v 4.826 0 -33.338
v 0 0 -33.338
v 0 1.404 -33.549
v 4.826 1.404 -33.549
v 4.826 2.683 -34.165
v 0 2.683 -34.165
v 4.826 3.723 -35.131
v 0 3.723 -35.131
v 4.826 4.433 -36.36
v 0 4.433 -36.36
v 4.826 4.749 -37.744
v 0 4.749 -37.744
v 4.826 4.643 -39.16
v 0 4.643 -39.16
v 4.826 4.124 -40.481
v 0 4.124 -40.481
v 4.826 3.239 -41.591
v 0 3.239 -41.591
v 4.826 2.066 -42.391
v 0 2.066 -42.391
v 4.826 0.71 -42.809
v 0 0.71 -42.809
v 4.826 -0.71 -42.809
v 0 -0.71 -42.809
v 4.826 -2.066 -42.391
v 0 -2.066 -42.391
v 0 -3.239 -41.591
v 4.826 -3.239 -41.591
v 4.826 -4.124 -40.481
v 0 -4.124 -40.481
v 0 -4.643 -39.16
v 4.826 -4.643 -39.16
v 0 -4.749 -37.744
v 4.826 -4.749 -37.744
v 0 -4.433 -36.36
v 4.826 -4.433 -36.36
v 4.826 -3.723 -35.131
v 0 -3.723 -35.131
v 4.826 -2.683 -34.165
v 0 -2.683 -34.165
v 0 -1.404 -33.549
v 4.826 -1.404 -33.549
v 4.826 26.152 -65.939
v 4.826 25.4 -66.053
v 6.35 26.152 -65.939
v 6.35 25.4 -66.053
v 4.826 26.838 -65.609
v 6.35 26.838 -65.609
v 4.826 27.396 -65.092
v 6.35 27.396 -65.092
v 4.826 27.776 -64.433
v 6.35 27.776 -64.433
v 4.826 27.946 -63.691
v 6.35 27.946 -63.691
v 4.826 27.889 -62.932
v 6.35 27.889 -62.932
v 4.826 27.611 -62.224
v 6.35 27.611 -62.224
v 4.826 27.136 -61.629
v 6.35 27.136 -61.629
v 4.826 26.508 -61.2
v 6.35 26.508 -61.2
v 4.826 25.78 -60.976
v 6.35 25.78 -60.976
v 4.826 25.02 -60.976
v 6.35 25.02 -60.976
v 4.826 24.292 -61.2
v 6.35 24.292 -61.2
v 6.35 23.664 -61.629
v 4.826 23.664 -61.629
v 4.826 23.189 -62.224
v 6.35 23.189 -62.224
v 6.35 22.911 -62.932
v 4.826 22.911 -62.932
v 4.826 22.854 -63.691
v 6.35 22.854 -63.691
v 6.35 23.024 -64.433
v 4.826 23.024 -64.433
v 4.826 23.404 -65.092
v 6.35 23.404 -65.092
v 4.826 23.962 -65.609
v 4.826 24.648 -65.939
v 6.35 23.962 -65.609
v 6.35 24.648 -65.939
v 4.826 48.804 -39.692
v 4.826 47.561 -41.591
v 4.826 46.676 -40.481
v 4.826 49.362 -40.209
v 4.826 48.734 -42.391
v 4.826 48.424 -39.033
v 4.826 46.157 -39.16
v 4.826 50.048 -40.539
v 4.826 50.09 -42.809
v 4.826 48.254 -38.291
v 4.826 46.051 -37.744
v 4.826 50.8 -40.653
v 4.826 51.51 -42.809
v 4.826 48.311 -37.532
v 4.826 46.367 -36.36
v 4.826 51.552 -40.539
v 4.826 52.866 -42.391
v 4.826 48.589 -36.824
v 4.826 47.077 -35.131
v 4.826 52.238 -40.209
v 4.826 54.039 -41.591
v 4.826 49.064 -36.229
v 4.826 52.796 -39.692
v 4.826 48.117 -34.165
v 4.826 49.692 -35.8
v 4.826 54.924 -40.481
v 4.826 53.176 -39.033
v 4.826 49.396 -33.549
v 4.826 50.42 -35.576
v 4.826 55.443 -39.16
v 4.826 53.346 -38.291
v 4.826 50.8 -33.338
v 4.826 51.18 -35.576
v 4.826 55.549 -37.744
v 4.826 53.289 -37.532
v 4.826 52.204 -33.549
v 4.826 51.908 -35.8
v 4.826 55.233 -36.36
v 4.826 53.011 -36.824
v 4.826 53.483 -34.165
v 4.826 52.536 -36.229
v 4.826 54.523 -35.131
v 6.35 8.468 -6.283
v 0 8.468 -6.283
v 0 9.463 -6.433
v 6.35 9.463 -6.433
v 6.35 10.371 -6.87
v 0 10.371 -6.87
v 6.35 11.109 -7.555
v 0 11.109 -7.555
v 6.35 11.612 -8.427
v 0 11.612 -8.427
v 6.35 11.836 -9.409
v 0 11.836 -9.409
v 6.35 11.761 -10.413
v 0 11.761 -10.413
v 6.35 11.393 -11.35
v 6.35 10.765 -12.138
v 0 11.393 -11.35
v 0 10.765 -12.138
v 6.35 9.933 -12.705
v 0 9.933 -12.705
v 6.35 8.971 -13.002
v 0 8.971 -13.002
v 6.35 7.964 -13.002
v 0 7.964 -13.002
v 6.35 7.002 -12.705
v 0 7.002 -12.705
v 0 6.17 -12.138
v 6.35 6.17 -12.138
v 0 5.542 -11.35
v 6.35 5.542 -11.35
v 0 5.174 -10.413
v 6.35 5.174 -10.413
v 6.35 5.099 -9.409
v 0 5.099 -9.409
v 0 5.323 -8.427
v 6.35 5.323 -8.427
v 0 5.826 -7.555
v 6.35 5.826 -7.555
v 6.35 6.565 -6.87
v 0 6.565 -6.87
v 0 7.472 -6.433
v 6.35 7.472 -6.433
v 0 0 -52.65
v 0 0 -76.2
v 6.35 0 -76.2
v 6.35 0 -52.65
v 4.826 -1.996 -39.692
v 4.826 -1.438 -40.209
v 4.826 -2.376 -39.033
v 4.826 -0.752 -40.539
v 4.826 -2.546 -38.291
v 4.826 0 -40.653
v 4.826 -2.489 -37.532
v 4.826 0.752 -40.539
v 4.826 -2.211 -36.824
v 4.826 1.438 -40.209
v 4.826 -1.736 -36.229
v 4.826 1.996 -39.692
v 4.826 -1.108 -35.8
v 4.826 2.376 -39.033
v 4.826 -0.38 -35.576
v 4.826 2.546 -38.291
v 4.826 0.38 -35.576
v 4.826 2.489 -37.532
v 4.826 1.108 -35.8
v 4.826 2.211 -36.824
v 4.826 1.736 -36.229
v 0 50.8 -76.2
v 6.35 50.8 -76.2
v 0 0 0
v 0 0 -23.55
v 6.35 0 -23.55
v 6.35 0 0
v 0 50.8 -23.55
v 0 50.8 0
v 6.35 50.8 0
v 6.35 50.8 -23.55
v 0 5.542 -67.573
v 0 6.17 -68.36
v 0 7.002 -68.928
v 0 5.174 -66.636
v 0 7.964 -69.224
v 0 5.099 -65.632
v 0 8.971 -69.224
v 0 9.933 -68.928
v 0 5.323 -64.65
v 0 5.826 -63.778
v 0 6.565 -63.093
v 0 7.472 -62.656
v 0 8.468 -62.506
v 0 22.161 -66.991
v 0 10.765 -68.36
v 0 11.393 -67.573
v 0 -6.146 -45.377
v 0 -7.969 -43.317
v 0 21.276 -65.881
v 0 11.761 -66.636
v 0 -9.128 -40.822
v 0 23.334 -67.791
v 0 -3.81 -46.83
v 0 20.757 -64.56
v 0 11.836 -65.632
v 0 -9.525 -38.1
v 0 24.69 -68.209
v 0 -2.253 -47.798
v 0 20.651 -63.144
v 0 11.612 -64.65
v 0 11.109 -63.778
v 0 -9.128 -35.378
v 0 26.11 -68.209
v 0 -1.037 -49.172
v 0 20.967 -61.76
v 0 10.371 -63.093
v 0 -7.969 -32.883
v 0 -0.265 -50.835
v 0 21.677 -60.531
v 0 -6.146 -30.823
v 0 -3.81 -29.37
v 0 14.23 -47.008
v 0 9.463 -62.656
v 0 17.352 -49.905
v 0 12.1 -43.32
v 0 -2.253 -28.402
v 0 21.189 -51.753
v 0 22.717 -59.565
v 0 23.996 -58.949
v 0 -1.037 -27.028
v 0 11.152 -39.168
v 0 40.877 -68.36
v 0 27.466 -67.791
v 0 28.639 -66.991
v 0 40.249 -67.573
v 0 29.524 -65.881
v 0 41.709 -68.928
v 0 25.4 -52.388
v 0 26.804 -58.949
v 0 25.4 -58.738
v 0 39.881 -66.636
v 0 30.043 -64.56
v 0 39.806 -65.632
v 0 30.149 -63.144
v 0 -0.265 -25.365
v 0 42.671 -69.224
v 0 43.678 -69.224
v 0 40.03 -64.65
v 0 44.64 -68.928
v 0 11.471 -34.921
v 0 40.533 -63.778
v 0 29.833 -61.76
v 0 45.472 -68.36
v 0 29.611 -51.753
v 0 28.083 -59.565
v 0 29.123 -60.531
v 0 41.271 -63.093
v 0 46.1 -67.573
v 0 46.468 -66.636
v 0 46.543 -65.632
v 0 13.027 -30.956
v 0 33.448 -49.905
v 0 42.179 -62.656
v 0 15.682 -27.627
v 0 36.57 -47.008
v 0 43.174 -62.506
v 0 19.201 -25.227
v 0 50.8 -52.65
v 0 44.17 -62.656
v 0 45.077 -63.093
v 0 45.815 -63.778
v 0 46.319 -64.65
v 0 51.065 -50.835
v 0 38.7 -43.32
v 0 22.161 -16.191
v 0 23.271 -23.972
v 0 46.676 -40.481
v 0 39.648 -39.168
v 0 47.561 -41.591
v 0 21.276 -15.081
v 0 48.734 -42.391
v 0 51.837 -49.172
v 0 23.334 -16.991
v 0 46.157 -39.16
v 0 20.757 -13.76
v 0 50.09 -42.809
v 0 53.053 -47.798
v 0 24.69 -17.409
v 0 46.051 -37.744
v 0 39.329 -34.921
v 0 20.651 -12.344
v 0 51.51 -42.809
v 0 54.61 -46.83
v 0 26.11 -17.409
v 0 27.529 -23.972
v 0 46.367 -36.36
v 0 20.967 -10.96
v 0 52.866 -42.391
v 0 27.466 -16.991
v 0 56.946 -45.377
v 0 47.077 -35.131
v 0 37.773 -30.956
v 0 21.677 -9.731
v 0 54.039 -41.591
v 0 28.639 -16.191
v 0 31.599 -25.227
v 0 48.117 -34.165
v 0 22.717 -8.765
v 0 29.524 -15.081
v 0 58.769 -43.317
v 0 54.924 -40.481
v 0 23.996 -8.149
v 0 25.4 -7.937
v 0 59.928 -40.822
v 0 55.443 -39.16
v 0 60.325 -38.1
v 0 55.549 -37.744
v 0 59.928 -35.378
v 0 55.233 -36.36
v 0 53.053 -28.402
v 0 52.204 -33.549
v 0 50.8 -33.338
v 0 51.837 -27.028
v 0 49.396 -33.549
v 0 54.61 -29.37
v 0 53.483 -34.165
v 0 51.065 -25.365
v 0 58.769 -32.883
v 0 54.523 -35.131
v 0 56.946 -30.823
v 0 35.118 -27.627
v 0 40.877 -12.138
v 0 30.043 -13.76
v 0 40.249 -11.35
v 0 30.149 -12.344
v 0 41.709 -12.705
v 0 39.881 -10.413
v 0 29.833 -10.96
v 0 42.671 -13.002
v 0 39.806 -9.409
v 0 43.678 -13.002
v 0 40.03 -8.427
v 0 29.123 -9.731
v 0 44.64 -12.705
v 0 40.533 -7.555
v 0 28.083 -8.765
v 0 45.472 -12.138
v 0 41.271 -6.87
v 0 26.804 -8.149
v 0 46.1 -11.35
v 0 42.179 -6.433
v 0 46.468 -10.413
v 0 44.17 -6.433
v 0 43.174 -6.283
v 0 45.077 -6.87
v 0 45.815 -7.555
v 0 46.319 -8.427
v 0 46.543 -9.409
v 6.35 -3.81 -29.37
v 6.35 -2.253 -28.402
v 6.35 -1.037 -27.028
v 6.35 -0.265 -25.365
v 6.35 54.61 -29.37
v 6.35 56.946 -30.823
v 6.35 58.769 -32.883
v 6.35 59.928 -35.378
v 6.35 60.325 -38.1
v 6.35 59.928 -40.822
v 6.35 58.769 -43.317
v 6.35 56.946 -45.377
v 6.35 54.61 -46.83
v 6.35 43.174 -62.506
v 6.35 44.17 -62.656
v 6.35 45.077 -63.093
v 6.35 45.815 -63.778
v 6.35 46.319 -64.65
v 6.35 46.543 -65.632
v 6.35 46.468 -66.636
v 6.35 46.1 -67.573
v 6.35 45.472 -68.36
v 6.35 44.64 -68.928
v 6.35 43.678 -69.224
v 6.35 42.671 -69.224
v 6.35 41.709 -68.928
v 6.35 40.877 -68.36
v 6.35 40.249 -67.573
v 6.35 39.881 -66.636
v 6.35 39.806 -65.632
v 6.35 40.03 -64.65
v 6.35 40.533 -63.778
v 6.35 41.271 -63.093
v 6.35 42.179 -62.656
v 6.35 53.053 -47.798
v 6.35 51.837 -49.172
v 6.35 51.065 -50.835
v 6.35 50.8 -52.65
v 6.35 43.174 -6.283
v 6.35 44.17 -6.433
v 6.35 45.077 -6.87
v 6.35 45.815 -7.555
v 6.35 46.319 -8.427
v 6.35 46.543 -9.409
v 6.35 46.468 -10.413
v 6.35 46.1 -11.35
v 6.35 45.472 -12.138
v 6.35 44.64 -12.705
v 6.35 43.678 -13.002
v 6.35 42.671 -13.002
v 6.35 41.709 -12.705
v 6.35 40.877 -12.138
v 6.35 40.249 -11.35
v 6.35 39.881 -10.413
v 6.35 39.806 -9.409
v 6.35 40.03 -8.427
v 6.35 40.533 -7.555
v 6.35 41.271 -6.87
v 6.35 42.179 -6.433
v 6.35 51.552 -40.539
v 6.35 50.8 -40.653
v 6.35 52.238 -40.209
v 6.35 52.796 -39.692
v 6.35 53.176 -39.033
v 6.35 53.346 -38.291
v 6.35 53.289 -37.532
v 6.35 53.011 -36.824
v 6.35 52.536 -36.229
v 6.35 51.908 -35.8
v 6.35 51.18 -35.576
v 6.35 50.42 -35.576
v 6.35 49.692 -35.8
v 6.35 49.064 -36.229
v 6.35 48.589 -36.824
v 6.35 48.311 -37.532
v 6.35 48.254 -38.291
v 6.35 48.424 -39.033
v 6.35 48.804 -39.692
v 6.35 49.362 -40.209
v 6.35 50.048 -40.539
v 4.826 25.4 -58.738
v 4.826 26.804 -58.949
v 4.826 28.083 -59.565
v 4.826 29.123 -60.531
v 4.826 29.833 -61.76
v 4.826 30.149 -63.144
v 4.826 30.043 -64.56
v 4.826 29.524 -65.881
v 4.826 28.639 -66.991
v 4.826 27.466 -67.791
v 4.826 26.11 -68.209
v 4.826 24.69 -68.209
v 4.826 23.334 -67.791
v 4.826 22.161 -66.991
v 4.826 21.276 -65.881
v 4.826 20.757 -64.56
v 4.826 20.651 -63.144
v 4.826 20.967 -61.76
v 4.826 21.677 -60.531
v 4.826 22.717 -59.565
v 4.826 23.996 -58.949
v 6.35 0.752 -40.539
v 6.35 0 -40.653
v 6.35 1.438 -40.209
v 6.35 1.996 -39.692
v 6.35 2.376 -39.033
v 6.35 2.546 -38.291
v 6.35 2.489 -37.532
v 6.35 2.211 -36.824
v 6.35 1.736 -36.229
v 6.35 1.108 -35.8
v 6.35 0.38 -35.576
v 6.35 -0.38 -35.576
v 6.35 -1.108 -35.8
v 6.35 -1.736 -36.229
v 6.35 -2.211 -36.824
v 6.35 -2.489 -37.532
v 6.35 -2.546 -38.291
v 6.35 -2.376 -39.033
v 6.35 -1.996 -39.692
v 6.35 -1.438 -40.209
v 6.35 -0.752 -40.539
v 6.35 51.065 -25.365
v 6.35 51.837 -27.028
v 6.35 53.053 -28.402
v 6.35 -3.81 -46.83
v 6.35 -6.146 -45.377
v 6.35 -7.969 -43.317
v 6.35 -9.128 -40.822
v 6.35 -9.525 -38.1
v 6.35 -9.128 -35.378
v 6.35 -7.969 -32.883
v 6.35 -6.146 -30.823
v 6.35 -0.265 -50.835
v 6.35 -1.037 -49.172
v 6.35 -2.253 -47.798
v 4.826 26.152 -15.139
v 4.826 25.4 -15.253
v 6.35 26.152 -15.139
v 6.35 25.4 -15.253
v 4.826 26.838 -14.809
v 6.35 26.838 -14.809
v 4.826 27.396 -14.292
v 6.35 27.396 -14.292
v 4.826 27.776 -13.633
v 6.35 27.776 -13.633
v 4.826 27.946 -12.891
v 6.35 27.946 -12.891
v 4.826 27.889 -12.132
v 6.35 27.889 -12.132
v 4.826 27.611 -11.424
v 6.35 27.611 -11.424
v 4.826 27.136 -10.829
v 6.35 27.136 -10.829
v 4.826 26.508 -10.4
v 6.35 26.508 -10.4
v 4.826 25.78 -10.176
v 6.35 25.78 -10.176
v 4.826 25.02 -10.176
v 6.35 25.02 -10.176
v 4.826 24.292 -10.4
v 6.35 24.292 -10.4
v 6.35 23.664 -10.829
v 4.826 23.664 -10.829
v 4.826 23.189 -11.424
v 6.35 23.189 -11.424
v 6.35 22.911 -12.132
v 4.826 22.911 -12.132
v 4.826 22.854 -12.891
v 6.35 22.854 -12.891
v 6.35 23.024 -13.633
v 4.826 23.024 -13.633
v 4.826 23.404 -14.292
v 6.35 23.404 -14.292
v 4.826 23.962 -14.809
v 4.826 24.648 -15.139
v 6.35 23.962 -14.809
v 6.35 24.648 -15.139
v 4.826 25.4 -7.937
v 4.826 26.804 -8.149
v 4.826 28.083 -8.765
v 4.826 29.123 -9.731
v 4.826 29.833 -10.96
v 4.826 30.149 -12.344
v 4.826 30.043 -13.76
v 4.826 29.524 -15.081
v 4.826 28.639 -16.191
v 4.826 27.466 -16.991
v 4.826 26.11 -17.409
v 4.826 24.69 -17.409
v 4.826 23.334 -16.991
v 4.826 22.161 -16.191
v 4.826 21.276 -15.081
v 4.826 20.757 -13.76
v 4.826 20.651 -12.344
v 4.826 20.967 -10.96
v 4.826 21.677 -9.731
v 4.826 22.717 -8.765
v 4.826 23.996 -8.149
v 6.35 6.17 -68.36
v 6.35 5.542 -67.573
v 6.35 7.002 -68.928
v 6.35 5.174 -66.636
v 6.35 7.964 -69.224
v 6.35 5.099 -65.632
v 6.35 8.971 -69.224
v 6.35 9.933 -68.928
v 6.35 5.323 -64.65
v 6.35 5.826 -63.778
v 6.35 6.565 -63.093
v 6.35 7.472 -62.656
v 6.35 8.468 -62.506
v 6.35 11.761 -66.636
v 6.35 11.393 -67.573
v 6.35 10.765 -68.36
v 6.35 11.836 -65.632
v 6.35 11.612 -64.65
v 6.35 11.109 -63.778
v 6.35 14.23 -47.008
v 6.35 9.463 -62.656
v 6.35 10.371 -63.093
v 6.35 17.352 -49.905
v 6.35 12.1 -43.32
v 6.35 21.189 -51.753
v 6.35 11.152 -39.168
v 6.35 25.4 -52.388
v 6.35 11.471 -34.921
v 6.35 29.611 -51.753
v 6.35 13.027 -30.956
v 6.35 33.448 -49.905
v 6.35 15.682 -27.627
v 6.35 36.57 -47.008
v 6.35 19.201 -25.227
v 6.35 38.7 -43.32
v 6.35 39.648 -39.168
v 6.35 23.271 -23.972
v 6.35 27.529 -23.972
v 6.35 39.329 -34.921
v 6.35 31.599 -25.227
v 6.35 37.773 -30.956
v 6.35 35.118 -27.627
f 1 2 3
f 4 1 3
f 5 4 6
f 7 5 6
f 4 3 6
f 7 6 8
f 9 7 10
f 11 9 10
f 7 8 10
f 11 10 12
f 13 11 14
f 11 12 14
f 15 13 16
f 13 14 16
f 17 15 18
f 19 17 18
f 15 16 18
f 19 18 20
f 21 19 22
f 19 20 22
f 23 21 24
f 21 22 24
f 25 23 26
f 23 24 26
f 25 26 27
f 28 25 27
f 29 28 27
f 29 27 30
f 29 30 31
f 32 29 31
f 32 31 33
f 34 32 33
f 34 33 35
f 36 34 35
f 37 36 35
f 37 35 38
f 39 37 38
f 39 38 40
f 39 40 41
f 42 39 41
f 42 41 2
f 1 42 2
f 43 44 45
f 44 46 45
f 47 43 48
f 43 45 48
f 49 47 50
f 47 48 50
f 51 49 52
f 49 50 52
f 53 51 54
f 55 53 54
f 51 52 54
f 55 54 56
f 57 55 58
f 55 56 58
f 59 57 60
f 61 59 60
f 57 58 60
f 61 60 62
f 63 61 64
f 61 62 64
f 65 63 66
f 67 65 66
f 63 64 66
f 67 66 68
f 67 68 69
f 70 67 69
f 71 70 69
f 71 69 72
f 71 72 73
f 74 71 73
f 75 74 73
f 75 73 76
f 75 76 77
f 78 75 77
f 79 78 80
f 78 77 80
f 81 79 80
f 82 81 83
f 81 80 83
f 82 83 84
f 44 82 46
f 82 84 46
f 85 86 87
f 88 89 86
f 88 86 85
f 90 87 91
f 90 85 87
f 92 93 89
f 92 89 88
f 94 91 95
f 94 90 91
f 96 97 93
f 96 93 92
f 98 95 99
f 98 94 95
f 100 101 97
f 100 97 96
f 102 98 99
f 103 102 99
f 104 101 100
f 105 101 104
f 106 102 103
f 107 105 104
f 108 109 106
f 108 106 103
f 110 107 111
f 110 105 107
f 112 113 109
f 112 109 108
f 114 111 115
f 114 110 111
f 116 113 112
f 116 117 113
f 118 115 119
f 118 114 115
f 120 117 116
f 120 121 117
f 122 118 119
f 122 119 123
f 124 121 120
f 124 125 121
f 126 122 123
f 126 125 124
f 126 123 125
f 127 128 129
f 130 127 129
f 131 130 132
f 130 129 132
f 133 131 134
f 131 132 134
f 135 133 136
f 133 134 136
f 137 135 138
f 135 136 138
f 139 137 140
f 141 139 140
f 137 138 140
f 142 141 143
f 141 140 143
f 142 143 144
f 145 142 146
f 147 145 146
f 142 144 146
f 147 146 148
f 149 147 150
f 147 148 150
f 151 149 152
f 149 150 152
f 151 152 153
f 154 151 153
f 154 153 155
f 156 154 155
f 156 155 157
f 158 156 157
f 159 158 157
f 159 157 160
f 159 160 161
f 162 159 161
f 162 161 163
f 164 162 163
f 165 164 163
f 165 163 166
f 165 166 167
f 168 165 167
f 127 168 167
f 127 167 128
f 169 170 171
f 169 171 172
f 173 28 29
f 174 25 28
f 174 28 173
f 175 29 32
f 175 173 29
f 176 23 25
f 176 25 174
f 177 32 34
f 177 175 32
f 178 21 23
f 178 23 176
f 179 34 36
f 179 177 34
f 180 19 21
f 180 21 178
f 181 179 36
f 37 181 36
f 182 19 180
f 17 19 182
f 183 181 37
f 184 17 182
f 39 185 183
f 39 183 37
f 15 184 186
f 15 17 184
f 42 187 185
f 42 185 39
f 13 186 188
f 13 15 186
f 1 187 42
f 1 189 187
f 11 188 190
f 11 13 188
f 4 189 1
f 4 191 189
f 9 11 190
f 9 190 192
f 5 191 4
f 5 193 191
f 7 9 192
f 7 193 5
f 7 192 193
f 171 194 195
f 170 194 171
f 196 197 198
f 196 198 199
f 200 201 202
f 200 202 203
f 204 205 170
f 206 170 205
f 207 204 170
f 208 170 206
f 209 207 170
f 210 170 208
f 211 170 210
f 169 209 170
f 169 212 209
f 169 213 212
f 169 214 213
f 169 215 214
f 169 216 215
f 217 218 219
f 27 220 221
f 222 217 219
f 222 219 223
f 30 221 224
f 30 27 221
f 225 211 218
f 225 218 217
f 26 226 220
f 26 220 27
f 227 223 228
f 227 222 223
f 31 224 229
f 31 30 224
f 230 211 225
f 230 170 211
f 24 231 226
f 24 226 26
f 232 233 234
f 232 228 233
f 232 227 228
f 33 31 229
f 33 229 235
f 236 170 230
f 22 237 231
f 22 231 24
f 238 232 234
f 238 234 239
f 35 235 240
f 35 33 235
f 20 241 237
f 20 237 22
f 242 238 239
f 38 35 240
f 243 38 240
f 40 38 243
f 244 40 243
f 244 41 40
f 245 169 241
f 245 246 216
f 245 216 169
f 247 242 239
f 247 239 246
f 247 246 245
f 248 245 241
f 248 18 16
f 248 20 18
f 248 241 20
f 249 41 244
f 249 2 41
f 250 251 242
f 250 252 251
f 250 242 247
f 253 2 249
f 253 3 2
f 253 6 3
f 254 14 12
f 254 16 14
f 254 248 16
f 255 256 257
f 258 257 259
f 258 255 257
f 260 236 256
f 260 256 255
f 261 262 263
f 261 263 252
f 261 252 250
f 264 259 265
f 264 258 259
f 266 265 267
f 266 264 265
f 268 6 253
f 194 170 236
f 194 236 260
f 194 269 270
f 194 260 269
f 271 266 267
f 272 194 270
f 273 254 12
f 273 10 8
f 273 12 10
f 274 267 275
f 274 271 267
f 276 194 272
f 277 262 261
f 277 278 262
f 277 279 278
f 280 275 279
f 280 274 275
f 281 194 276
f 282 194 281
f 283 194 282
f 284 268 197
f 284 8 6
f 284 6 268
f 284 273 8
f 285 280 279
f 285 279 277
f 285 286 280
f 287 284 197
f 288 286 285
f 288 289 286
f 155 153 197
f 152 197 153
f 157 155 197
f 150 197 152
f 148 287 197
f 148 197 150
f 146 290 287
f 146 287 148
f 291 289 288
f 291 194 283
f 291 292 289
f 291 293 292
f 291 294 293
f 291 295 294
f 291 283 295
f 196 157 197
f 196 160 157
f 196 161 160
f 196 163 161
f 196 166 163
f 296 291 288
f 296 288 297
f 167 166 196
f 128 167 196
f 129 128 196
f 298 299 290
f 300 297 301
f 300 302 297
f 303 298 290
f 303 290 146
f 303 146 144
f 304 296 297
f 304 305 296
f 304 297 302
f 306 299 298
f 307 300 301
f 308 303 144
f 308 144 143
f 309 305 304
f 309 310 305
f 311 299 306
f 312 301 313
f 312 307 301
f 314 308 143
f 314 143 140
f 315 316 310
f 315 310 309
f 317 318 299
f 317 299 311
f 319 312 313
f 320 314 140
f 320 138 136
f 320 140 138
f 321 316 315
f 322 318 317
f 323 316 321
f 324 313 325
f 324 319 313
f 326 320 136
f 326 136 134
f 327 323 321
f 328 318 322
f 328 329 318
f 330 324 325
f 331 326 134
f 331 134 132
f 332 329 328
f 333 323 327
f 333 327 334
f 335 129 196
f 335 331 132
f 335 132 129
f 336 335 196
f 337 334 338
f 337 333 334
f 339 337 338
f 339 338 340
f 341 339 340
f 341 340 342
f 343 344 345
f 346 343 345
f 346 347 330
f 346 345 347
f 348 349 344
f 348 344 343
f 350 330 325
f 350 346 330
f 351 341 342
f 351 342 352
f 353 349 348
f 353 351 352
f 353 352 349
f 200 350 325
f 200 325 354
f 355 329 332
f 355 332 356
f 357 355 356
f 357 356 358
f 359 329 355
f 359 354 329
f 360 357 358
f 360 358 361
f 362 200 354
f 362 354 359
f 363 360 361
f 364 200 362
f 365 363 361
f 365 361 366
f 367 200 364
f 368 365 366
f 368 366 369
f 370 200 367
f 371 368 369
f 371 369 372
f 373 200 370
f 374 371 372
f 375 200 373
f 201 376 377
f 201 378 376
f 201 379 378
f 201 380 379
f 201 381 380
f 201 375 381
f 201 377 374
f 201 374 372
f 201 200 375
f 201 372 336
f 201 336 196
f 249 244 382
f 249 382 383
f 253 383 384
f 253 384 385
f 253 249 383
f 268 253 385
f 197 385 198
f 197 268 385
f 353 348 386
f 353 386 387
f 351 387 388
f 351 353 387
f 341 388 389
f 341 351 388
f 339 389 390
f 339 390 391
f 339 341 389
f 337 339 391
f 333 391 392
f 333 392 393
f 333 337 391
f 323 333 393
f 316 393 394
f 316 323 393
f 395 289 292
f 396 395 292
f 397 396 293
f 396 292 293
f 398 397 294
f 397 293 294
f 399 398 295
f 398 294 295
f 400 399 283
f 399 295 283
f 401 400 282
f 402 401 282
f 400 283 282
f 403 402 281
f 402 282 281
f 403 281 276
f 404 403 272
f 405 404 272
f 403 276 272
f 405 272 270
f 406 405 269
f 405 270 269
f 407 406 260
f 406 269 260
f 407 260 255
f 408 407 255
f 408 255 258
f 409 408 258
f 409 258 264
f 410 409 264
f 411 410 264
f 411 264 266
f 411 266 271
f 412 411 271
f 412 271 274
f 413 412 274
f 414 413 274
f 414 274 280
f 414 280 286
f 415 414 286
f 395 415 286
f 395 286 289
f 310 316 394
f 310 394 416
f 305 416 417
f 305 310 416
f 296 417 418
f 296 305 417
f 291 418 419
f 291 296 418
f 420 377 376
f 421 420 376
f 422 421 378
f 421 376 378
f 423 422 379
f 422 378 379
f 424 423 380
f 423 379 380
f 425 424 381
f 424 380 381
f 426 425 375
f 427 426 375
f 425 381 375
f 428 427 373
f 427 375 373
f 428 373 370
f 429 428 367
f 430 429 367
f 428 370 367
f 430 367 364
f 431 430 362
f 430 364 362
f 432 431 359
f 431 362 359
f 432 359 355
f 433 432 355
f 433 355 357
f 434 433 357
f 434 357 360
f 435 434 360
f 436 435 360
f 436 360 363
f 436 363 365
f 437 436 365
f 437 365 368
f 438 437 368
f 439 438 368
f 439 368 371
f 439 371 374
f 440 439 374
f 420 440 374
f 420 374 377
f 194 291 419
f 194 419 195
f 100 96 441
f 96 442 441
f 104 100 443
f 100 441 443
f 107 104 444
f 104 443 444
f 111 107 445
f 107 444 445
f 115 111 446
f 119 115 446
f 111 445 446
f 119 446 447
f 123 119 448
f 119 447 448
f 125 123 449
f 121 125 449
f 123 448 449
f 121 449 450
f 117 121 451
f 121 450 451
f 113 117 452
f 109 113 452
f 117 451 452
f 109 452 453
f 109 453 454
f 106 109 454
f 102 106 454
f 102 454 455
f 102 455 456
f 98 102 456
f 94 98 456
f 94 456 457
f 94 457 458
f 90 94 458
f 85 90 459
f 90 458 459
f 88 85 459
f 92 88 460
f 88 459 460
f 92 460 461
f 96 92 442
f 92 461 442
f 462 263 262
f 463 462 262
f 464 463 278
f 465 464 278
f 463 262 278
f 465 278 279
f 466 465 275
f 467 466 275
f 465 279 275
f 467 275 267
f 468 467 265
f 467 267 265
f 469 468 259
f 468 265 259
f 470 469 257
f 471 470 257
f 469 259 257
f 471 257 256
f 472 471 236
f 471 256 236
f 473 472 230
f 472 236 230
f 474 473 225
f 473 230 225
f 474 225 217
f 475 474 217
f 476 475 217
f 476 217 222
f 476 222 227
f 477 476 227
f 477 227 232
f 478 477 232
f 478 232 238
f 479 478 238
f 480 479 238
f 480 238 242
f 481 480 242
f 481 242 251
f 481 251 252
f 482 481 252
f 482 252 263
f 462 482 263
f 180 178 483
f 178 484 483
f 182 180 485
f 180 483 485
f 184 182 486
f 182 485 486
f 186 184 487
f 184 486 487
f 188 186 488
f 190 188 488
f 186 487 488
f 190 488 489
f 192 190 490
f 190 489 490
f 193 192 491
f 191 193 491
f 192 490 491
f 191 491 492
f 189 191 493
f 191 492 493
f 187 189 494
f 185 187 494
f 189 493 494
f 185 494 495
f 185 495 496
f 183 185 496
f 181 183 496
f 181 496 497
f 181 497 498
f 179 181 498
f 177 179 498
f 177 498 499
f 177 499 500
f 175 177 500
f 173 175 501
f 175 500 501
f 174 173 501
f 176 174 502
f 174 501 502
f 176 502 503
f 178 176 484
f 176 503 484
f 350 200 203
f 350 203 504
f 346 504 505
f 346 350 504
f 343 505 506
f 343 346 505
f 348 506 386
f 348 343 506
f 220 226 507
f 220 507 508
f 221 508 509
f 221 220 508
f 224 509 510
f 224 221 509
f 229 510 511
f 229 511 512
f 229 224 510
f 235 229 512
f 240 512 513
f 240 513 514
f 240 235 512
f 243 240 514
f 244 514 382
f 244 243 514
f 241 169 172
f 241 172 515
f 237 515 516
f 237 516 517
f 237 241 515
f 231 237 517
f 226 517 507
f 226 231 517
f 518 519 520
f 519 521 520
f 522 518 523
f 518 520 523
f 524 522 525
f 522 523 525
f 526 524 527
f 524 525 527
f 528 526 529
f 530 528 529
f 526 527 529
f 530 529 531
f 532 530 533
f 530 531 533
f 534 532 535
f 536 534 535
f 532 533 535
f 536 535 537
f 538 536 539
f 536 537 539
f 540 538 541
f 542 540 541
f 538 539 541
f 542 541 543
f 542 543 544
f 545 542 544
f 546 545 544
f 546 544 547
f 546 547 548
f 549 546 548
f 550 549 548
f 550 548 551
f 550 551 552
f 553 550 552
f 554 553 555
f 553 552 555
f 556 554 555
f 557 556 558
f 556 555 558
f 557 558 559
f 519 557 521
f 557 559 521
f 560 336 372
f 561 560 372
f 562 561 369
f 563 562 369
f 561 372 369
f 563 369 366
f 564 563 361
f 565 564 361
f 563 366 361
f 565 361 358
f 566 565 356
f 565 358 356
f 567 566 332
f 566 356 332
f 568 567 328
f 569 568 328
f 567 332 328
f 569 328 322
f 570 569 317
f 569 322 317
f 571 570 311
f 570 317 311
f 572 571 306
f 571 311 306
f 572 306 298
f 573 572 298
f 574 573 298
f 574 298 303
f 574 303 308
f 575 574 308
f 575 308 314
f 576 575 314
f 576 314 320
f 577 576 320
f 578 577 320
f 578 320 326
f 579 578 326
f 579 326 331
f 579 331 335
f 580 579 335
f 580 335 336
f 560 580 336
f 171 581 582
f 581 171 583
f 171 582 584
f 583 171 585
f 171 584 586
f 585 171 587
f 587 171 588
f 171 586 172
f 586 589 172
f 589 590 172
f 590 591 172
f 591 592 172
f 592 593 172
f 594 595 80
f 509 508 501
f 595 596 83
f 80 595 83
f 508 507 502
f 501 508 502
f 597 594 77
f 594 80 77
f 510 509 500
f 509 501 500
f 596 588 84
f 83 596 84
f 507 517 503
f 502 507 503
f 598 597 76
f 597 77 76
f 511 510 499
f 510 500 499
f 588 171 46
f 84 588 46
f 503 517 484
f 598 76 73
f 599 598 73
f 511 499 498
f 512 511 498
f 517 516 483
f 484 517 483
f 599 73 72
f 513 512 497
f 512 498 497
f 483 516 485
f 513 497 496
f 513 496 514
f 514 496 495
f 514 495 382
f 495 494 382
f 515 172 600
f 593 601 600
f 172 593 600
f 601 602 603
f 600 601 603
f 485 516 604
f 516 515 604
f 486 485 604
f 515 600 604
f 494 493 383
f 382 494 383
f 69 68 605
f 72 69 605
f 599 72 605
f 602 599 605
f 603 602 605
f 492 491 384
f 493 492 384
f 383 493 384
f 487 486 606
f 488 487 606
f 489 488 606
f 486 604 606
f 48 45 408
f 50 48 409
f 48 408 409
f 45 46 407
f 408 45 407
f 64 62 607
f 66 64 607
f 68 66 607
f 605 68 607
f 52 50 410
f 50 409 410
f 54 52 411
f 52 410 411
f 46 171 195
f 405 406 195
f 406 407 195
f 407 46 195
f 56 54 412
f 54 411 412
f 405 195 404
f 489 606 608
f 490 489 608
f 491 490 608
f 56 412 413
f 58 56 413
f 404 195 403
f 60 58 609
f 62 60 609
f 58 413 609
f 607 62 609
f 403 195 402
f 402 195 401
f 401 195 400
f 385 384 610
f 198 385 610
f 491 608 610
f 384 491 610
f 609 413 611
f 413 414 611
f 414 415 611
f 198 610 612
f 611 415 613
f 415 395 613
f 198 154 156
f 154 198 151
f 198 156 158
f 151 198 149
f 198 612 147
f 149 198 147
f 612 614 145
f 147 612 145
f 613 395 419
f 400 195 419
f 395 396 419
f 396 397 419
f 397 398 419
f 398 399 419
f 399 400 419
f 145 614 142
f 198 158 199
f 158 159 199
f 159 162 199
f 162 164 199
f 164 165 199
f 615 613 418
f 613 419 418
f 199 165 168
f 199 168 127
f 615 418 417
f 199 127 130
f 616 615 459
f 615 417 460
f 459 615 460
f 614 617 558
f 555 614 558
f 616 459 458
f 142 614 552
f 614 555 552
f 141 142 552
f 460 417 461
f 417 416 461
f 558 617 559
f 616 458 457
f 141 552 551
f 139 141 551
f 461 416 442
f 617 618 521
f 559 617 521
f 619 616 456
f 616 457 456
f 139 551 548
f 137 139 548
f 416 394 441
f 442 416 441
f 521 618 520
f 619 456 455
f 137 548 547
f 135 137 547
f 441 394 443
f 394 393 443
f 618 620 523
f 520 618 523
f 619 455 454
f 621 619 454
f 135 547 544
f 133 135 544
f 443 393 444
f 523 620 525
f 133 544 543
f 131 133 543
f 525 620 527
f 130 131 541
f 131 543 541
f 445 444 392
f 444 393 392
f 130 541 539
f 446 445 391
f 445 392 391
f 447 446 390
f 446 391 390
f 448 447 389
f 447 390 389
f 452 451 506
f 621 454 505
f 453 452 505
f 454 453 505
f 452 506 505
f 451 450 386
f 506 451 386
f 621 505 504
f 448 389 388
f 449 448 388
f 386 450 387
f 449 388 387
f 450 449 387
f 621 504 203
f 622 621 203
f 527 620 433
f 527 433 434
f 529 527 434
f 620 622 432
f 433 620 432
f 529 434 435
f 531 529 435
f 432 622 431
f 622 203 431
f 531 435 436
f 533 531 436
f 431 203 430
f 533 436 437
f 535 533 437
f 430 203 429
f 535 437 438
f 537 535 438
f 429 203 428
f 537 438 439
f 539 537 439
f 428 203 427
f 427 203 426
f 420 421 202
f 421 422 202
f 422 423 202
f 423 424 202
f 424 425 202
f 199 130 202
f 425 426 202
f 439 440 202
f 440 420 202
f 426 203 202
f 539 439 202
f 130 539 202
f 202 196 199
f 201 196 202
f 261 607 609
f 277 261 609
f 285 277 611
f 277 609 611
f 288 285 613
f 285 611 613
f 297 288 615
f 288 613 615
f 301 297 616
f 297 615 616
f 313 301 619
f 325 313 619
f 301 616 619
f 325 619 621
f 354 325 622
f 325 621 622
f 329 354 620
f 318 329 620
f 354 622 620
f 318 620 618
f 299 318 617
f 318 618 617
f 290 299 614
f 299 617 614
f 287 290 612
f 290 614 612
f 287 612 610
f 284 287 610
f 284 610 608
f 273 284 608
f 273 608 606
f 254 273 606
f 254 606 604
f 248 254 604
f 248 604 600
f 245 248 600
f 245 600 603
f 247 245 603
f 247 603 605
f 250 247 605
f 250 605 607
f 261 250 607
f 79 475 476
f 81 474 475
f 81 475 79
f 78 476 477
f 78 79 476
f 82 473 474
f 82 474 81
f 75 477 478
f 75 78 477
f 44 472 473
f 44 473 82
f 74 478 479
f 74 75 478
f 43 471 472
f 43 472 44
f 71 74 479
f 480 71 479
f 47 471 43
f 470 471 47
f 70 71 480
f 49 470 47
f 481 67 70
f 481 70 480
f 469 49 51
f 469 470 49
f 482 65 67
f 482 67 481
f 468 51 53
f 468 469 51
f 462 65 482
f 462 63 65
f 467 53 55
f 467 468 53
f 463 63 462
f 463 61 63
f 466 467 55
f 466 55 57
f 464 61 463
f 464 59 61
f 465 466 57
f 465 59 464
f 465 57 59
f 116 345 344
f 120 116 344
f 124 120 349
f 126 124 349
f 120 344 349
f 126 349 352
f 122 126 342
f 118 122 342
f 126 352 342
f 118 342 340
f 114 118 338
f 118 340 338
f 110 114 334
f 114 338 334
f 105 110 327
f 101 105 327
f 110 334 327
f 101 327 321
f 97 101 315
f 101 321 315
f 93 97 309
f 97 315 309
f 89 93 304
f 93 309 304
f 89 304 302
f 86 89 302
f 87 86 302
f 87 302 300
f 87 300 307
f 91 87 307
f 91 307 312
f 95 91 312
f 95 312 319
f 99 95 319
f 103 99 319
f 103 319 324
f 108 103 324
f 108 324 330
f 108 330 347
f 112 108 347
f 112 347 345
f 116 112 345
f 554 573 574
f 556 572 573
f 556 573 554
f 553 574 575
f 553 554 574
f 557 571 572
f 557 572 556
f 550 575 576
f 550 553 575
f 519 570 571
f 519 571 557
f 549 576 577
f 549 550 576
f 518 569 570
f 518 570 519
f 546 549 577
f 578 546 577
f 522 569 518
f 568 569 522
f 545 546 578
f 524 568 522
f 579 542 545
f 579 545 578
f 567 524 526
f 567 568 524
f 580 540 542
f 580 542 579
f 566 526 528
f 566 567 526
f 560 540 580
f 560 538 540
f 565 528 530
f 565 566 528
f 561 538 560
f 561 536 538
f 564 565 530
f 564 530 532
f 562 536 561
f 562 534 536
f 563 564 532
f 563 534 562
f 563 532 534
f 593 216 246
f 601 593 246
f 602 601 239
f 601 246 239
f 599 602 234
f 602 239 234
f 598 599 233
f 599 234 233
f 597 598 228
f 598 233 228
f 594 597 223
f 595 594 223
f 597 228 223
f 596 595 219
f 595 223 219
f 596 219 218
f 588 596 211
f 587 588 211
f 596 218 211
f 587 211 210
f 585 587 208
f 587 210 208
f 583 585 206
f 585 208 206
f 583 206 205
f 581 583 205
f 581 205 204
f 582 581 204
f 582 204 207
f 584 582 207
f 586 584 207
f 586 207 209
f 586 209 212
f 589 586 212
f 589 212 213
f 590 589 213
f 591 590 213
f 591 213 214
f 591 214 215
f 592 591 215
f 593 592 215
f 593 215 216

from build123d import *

# Parameters (mm, degrees)
BOSS_EXTRUDE1_DEPTH                             = 6.35
SKETCH2_R                                       = 14.2875
CUT_EXTRUDE1_DEPTH                              = 98.395421479
CBORE_FOR_10_SOCKET_HEAD_CAP_SCREW1_D           = 5.1054
CBORE_FOR_10_SOCKET_HEAD_CAP_SCREW1_CBORE_D     = 9.525
CBORE_FOR_10_SOCKET_HEAD_CAP_SCREW1_CBORE_DEPTH = 4.826
F_1_4_CLEARANCE_HOLE1_D                         = 6.7564


with BuildPart() as part:
    # Sketch1 → Boss-Extrude1 (new body)
    with BuildSketch(Plane(origin=(0, 0, 0), x_dir=(0, 0, -1), z_dir=(1, 0, 0))):
        with BuildLine():
            Line((52.649677831, 50.8), (76.2, 50.8))
            Line((76.2, 50.8), (76.2, 0))
            Line((76.2, 0), (52.649677831, 0))
            ThreePointArc((52.649677831, 0), (49.171639591, -1.037208832), (46.829806699, -3.81))
            ThreePointArc((46.829806699, -3.81), (38.1, -9.525), (29.370193301, -3.81))
            ThreePointArc((29.370193301, -3.81), (27.028360409, -1.037208832), (23.550322169, 0))
            Line((23.550322169, 0), (0, 0))
            Line((0, 0), (0, 50.8))
            Line((0, 50.8), (23.550322169, 50.8))
            ThreePointArc((23.550322169, 50.8), (27.028360409, 51.837208832), (29.370193301, 54.61))
            ThreePointArc((29.370193301, 54.61), (38.1, 60.325), (46.829806699, 54.61))
            ThreePointArc((46.829806699, 54.61), (49.171639591, 51.837208832), (52.649677831, 50.8))
        make_face()
    extrude(amount=BOSS_EXTRUDE1_DEPTH)

    # Sketch2 → Cut-Extrude1 (cut, through all)
    with BuildSketch(Plane(origin=(6.35, 0, 0), x_dir=(0, 0, -1), z_dir=(1, 0, 0))):
        with Locations((38.1, 25.4)):
            Circle(SKETCH2_R)
    extrude(amount=-CUT_EXTRUDE1_DEPTH, mode=Mode.SUBTRACT)

    # CBORE for #10 Socket Head Cap Screw1 (through all)
    with Locations(Plane.ZY):
        with Locations((-63.5, 25.4), (-38.1, 50.8), (-12.7, 25.4), (-38.1, 0)):
            CounterBoreHole(CBORE_FOR_10_SOCKET_HEAD_CAP_SCREW1_D / 2, CBORE_FOR_10_SOCKET_HEAD_CAP_SCREW1_CBORE_D / 2, CBORE_FOR_10_SOCKET_HEAD_CAP_SCREW1_CBORE_DEPTH)

    # 1/4 Clearance Hole1 (through all)
    with Locations(Plane(origin=(6.35, 0, 0), x_dir=(0, 0, -1), z_dir=(1, 0, 0))):
        with Locations((9.661126973, 43.174295642), (65.884030556, 43.174295642), (65.884030556, 8.467644678), (9.661126973, 8.467644678)):
            Hole(F_1_4_CLEARANCE_HOLE1_D / 2)


solid = part.part
